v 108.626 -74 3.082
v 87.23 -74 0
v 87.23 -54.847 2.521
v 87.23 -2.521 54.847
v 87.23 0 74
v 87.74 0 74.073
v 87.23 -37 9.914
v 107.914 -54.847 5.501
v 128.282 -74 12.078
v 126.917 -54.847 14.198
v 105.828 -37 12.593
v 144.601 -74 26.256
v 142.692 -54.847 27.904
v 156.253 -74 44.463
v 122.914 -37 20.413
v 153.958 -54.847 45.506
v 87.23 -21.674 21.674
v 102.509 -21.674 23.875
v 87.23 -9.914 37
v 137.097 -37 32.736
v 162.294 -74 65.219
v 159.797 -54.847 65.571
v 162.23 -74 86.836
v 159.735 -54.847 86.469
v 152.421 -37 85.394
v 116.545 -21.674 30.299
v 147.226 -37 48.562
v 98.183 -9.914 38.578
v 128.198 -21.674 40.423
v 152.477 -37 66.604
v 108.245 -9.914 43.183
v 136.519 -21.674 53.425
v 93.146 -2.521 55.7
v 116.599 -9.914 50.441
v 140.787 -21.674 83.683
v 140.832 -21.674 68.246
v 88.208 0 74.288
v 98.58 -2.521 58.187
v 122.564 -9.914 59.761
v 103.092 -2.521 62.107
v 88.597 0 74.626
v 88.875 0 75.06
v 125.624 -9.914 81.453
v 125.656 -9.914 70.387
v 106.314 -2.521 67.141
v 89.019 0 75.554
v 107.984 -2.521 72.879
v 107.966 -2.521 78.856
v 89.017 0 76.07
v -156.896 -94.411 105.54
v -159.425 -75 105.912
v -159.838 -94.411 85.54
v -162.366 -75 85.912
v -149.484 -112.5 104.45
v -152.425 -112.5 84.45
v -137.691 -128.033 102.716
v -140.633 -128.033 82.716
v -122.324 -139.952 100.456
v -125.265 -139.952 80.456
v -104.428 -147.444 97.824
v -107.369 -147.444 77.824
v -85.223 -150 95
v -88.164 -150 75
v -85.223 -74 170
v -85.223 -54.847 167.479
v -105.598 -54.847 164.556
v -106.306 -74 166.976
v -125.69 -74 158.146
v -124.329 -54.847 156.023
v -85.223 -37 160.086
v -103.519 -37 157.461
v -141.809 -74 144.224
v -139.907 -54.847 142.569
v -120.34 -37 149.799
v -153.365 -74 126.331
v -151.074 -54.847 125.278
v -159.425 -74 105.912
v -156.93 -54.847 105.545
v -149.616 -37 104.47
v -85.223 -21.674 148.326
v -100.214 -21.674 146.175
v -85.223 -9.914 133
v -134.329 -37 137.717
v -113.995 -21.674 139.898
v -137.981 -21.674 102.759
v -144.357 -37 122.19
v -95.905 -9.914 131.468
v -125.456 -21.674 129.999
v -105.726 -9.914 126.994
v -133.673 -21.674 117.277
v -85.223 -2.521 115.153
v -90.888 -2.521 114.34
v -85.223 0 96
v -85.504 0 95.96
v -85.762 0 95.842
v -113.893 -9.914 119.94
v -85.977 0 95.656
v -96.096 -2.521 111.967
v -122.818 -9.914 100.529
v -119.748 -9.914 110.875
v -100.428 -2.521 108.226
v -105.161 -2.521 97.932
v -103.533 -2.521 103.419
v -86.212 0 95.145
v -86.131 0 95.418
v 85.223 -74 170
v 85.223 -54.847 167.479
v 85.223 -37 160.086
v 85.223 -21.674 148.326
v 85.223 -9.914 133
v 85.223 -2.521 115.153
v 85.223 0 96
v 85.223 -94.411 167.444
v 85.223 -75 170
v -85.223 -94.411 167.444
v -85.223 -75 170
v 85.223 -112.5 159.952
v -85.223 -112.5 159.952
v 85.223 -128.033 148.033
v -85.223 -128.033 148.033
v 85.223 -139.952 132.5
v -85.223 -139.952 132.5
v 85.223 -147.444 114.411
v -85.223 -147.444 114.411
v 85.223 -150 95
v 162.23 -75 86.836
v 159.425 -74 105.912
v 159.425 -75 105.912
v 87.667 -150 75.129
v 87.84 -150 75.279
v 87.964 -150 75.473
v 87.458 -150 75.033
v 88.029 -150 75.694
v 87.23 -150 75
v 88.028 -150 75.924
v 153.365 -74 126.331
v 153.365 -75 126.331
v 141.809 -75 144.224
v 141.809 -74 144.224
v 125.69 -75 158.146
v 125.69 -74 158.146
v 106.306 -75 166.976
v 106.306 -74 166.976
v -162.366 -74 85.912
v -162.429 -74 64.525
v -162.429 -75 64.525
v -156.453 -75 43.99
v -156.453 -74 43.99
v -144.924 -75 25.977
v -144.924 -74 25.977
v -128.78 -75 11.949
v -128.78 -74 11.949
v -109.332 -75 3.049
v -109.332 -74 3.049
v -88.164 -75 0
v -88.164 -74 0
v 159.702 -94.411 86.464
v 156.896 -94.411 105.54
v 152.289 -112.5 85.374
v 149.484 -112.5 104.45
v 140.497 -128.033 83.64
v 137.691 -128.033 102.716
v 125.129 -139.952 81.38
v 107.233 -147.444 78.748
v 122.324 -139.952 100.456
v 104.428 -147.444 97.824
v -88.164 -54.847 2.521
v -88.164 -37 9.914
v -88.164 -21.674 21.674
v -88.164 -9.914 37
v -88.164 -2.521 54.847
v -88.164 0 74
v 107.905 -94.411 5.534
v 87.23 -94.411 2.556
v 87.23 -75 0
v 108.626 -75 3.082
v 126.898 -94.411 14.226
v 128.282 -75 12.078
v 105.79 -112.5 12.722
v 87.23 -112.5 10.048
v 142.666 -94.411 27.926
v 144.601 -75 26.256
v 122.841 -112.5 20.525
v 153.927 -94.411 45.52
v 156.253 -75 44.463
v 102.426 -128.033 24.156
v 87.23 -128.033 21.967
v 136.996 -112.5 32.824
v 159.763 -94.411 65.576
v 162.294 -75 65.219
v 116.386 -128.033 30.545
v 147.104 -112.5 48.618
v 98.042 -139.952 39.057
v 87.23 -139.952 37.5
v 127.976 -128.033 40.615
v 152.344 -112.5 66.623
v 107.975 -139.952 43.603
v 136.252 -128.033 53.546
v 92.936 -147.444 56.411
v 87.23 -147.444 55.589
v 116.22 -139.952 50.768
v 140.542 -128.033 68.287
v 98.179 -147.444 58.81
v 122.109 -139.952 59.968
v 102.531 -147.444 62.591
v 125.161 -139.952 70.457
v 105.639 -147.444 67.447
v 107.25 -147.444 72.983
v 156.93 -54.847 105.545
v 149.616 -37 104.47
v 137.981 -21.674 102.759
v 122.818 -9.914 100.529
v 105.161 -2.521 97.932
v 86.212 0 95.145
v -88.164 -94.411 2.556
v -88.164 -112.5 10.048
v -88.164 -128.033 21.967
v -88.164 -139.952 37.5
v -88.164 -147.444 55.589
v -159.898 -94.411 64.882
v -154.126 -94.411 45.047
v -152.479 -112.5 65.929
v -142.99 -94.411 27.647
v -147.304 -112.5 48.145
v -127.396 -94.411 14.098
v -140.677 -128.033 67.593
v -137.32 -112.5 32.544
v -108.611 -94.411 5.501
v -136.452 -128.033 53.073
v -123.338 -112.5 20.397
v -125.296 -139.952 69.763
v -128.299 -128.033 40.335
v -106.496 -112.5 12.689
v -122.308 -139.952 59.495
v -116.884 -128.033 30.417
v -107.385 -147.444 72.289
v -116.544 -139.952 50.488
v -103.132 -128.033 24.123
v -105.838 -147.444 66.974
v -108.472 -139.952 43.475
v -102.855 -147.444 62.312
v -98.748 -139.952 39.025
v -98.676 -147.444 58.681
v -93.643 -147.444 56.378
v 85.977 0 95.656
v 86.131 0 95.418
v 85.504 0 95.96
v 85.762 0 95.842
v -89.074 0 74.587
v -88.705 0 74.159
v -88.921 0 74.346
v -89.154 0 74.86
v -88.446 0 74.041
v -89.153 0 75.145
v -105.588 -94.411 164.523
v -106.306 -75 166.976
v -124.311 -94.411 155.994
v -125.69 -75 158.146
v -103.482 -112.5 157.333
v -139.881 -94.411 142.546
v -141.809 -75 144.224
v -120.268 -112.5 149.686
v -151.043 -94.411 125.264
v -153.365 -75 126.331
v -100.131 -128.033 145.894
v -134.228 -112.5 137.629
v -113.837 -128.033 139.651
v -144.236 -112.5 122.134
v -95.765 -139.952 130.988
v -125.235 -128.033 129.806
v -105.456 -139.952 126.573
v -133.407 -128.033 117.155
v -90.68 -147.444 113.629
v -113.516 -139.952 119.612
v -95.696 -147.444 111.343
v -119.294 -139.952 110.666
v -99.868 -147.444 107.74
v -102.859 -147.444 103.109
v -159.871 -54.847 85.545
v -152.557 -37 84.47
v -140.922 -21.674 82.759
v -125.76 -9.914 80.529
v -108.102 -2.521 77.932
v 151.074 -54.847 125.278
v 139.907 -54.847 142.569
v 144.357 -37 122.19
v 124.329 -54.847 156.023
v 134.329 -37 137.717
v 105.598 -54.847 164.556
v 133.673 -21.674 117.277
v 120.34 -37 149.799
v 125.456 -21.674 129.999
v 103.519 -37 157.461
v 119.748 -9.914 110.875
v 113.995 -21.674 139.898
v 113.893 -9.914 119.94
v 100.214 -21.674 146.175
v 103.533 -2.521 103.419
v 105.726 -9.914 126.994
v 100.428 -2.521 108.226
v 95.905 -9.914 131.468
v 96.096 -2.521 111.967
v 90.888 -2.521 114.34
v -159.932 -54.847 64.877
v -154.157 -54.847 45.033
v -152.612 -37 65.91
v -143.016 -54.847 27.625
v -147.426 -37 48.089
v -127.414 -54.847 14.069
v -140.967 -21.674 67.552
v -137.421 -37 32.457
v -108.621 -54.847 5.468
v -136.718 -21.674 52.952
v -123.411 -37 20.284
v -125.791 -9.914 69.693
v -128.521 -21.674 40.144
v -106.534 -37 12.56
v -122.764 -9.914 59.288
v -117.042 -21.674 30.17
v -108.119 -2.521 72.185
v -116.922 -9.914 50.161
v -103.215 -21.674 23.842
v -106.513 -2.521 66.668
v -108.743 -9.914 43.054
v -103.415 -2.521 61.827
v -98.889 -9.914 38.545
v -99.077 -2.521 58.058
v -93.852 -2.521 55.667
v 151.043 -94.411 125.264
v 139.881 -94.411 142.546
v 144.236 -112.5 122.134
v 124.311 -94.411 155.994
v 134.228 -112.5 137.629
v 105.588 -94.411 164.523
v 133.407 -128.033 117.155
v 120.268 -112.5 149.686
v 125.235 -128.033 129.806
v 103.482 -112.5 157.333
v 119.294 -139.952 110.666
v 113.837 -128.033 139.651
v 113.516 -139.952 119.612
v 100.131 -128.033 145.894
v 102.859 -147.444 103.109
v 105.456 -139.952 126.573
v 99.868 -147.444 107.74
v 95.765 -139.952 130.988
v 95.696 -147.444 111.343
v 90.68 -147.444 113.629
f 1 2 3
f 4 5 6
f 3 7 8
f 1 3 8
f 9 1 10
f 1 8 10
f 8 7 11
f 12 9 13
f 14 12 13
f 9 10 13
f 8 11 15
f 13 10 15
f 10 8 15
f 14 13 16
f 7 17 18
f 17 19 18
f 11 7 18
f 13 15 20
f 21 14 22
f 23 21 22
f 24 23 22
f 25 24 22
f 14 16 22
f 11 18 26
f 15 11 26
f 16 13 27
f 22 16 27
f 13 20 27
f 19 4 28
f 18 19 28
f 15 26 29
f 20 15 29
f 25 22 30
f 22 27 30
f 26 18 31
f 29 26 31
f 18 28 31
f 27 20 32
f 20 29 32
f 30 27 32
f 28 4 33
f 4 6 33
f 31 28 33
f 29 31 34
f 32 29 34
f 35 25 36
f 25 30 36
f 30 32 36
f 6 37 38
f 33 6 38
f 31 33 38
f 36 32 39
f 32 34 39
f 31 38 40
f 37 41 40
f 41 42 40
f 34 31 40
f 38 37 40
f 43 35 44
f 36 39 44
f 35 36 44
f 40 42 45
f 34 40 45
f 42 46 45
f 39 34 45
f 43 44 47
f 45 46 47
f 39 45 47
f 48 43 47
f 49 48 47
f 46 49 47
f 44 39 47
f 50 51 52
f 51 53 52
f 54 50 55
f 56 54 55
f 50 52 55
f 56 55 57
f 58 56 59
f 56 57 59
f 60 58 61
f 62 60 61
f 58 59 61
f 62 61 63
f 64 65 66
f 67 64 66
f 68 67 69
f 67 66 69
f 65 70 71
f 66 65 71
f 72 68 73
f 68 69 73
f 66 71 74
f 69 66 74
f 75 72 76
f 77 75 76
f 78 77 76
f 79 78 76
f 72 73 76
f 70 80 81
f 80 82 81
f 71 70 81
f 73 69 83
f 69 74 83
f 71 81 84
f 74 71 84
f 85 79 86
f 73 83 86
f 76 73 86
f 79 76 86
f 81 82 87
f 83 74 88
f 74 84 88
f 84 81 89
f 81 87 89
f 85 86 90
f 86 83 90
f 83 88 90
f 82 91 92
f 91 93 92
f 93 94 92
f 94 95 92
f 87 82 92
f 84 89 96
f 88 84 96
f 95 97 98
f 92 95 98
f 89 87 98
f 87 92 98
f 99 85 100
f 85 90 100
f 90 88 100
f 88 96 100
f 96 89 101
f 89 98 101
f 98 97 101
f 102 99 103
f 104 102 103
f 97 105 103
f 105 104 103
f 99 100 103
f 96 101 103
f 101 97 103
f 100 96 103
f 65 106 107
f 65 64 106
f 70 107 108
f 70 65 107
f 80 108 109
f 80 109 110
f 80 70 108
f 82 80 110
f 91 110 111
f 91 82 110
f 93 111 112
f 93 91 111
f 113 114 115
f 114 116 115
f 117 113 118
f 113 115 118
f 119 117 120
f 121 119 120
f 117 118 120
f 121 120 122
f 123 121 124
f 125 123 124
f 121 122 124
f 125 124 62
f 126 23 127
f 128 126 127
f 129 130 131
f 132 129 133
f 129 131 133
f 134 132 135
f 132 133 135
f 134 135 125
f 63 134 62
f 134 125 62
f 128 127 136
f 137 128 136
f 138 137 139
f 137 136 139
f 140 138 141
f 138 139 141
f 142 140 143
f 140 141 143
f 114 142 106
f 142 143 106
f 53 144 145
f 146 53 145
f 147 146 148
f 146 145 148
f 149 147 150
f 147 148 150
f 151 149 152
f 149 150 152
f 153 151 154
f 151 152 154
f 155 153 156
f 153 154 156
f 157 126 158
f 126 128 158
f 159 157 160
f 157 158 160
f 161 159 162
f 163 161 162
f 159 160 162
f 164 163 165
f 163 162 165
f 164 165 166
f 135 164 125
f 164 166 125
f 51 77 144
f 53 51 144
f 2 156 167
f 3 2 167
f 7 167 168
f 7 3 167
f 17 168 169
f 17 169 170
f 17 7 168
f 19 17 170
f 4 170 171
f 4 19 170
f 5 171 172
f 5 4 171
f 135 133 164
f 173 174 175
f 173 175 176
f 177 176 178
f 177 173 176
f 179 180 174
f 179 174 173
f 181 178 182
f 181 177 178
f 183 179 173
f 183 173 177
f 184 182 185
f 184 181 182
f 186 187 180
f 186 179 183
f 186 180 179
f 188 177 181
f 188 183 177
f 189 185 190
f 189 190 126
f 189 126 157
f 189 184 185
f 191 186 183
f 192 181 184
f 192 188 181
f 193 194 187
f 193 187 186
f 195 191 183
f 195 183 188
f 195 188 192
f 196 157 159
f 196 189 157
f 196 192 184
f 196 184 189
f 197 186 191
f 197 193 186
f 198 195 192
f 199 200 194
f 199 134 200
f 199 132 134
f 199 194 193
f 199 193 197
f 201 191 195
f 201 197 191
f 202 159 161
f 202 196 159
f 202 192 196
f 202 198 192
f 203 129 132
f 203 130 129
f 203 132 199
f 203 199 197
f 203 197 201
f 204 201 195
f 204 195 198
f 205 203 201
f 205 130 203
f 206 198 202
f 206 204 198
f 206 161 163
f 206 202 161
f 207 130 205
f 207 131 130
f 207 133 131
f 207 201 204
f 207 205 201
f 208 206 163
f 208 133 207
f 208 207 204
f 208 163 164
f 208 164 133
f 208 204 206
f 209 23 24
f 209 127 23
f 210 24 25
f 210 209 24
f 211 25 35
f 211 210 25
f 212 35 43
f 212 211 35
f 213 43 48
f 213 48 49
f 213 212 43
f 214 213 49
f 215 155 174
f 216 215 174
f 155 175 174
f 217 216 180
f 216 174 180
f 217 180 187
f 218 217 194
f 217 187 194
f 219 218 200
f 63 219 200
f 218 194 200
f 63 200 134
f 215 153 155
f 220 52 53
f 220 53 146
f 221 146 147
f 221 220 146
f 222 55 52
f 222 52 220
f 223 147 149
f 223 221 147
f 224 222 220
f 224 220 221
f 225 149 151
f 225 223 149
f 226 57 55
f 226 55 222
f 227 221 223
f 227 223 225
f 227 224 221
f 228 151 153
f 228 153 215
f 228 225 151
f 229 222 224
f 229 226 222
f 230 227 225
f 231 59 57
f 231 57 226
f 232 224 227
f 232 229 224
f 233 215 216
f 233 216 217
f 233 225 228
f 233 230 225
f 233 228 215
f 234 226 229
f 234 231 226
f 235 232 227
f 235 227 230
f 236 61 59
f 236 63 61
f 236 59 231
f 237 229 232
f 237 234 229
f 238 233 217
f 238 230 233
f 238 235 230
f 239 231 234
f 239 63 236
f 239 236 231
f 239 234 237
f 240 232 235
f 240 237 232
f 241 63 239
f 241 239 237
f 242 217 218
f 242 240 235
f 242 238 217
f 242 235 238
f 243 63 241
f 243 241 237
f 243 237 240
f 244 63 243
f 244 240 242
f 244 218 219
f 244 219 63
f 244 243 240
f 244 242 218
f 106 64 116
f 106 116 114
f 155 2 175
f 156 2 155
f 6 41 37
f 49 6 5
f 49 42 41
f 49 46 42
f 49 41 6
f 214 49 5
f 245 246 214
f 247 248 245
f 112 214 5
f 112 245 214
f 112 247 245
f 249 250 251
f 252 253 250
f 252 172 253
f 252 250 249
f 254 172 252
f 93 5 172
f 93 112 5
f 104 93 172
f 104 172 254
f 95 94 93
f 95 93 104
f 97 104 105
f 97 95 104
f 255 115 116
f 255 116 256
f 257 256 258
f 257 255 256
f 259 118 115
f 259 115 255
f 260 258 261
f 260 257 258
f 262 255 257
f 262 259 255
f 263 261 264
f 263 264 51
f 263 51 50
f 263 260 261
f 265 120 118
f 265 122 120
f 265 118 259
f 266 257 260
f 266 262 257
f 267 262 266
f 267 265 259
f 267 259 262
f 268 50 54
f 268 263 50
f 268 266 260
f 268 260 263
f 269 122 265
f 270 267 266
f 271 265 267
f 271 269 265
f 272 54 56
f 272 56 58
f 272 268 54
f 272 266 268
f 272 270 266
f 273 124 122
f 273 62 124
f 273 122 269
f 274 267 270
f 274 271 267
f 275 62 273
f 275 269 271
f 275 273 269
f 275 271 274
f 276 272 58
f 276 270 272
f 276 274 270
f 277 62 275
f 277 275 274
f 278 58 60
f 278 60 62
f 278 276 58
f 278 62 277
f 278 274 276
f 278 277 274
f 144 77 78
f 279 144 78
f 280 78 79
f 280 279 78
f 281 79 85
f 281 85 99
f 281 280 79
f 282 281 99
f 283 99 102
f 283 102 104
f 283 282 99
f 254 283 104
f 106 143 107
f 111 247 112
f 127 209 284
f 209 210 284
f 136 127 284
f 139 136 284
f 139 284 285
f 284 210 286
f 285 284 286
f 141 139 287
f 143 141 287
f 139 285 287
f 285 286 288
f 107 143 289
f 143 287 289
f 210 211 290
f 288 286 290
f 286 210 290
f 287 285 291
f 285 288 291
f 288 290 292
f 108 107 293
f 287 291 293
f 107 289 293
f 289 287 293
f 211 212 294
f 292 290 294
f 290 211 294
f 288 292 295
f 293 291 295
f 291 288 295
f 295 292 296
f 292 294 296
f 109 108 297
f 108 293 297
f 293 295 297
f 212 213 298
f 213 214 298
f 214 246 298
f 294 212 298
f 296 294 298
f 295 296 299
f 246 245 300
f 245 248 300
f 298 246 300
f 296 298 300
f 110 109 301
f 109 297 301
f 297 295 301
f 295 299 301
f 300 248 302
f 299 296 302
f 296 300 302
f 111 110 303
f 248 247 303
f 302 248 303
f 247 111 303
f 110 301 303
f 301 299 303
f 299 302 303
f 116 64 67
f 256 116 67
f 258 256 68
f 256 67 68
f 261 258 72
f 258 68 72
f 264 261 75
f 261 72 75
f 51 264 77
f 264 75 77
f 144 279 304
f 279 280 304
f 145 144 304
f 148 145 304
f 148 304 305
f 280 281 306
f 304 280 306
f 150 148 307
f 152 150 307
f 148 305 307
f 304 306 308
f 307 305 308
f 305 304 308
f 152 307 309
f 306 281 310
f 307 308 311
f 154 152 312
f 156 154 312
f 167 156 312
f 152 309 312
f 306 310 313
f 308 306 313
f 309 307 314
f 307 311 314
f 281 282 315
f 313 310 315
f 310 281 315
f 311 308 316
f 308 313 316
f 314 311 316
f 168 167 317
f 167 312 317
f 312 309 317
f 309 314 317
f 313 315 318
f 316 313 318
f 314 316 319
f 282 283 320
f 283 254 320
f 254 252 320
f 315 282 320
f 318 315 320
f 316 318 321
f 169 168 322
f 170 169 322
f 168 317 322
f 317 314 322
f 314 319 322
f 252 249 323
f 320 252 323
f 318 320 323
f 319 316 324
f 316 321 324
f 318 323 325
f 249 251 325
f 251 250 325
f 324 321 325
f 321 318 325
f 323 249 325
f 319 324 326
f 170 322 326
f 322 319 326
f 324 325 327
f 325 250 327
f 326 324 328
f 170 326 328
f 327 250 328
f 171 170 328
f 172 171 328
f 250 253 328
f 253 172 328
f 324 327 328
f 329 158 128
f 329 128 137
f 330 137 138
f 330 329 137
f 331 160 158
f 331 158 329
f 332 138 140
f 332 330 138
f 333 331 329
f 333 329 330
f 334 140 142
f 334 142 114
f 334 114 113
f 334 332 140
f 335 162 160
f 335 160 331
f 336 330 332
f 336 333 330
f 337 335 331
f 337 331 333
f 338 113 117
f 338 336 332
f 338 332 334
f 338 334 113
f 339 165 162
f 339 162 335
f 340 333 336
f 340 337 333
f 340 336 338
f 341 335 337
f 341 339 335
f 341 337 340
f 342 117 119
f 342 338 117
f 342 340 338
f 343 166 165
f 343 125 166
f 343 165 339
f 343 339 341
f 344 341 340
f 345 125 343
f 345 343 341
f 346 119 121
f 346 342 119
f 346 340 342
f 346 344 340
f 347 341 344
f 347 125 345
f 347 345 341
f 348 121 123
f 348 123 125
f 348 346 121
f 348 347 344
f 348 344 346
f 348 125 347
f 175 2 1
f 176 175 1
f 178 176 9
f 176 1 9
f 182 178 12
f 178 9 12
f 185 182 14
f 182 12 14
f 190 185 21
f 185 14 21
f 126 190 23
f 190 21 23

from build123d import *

# Parameters (mm, degrees)
PAD001_DEPTH = 150
FILLET002_R  = 75
FILLET003_R  = 74


with BuildPart() as part:
    # Sketch009 → Pad001 (new body)
    with BuildSketch(Plane.XZ):
        with BuildLine():
            Line((-85.222763, 170), (85.222763, 170))
            ThreePointArc((159.424699, 105.912049), (134.246208, 151.760037), (85.222763, 170))
            Line((162.229991, 86.83606), (159.424699, 105.912049))
            ThreePointArc((87.229991, 0), (144.6005, 26.255941), (162.229991, 86.83606))
            Line((87.229991, 0), (-88.16394, 0))
            ThreePointArc((-162.365875, 85.912049), (-144.923977, 25.976555), (-88.16394, 0))
            Line((-159.424699, 105.912049), (-162.365875, 85.912049))
            ThreePointArc((-85.222763, 170), (-134.246208, 151.760037), (-159.424699, 105.912049))
        make_face()
    extrude(amount=PAD001_DEPTH)

    # Fillet002
    fillet002_edges = [part.edges().sort_by_distance(p)[0] for p in [
        (-134.246208, -150, 151.760037),
        (0, -150, 170),
        (134.246208, -150, 151.760037),
        (160.827345, -150, 96.374055),
        (144.6005, -150, 26.255941),
        (-0.466974, -150, 0),
        (-144.923977, -150, 25.976555),
        (-160.895287, -150, 95.912049),
    ]]
    fillet(fillet002_edges, radius=FILLET002_R)

    # Fillet003
    fillet003_edges = [part.edges().sort_by_distance(p)[0] for p in [
        (-134.246208, 0, 151.760037),
        (0, 0, 170),
        (134.246208, 0, 151.760037),
        (160.827345, 0, 96.374055),
        (144.6005, 0, 26.255941),
        (-0.466974, 0, 0),
        (-144.923977, 0, 25.976555),
        (-160.895287, 0, 95.912049),
    ]]
    fillet(fillet003_edges, radius=FILLET003_R)


solid = part.part
